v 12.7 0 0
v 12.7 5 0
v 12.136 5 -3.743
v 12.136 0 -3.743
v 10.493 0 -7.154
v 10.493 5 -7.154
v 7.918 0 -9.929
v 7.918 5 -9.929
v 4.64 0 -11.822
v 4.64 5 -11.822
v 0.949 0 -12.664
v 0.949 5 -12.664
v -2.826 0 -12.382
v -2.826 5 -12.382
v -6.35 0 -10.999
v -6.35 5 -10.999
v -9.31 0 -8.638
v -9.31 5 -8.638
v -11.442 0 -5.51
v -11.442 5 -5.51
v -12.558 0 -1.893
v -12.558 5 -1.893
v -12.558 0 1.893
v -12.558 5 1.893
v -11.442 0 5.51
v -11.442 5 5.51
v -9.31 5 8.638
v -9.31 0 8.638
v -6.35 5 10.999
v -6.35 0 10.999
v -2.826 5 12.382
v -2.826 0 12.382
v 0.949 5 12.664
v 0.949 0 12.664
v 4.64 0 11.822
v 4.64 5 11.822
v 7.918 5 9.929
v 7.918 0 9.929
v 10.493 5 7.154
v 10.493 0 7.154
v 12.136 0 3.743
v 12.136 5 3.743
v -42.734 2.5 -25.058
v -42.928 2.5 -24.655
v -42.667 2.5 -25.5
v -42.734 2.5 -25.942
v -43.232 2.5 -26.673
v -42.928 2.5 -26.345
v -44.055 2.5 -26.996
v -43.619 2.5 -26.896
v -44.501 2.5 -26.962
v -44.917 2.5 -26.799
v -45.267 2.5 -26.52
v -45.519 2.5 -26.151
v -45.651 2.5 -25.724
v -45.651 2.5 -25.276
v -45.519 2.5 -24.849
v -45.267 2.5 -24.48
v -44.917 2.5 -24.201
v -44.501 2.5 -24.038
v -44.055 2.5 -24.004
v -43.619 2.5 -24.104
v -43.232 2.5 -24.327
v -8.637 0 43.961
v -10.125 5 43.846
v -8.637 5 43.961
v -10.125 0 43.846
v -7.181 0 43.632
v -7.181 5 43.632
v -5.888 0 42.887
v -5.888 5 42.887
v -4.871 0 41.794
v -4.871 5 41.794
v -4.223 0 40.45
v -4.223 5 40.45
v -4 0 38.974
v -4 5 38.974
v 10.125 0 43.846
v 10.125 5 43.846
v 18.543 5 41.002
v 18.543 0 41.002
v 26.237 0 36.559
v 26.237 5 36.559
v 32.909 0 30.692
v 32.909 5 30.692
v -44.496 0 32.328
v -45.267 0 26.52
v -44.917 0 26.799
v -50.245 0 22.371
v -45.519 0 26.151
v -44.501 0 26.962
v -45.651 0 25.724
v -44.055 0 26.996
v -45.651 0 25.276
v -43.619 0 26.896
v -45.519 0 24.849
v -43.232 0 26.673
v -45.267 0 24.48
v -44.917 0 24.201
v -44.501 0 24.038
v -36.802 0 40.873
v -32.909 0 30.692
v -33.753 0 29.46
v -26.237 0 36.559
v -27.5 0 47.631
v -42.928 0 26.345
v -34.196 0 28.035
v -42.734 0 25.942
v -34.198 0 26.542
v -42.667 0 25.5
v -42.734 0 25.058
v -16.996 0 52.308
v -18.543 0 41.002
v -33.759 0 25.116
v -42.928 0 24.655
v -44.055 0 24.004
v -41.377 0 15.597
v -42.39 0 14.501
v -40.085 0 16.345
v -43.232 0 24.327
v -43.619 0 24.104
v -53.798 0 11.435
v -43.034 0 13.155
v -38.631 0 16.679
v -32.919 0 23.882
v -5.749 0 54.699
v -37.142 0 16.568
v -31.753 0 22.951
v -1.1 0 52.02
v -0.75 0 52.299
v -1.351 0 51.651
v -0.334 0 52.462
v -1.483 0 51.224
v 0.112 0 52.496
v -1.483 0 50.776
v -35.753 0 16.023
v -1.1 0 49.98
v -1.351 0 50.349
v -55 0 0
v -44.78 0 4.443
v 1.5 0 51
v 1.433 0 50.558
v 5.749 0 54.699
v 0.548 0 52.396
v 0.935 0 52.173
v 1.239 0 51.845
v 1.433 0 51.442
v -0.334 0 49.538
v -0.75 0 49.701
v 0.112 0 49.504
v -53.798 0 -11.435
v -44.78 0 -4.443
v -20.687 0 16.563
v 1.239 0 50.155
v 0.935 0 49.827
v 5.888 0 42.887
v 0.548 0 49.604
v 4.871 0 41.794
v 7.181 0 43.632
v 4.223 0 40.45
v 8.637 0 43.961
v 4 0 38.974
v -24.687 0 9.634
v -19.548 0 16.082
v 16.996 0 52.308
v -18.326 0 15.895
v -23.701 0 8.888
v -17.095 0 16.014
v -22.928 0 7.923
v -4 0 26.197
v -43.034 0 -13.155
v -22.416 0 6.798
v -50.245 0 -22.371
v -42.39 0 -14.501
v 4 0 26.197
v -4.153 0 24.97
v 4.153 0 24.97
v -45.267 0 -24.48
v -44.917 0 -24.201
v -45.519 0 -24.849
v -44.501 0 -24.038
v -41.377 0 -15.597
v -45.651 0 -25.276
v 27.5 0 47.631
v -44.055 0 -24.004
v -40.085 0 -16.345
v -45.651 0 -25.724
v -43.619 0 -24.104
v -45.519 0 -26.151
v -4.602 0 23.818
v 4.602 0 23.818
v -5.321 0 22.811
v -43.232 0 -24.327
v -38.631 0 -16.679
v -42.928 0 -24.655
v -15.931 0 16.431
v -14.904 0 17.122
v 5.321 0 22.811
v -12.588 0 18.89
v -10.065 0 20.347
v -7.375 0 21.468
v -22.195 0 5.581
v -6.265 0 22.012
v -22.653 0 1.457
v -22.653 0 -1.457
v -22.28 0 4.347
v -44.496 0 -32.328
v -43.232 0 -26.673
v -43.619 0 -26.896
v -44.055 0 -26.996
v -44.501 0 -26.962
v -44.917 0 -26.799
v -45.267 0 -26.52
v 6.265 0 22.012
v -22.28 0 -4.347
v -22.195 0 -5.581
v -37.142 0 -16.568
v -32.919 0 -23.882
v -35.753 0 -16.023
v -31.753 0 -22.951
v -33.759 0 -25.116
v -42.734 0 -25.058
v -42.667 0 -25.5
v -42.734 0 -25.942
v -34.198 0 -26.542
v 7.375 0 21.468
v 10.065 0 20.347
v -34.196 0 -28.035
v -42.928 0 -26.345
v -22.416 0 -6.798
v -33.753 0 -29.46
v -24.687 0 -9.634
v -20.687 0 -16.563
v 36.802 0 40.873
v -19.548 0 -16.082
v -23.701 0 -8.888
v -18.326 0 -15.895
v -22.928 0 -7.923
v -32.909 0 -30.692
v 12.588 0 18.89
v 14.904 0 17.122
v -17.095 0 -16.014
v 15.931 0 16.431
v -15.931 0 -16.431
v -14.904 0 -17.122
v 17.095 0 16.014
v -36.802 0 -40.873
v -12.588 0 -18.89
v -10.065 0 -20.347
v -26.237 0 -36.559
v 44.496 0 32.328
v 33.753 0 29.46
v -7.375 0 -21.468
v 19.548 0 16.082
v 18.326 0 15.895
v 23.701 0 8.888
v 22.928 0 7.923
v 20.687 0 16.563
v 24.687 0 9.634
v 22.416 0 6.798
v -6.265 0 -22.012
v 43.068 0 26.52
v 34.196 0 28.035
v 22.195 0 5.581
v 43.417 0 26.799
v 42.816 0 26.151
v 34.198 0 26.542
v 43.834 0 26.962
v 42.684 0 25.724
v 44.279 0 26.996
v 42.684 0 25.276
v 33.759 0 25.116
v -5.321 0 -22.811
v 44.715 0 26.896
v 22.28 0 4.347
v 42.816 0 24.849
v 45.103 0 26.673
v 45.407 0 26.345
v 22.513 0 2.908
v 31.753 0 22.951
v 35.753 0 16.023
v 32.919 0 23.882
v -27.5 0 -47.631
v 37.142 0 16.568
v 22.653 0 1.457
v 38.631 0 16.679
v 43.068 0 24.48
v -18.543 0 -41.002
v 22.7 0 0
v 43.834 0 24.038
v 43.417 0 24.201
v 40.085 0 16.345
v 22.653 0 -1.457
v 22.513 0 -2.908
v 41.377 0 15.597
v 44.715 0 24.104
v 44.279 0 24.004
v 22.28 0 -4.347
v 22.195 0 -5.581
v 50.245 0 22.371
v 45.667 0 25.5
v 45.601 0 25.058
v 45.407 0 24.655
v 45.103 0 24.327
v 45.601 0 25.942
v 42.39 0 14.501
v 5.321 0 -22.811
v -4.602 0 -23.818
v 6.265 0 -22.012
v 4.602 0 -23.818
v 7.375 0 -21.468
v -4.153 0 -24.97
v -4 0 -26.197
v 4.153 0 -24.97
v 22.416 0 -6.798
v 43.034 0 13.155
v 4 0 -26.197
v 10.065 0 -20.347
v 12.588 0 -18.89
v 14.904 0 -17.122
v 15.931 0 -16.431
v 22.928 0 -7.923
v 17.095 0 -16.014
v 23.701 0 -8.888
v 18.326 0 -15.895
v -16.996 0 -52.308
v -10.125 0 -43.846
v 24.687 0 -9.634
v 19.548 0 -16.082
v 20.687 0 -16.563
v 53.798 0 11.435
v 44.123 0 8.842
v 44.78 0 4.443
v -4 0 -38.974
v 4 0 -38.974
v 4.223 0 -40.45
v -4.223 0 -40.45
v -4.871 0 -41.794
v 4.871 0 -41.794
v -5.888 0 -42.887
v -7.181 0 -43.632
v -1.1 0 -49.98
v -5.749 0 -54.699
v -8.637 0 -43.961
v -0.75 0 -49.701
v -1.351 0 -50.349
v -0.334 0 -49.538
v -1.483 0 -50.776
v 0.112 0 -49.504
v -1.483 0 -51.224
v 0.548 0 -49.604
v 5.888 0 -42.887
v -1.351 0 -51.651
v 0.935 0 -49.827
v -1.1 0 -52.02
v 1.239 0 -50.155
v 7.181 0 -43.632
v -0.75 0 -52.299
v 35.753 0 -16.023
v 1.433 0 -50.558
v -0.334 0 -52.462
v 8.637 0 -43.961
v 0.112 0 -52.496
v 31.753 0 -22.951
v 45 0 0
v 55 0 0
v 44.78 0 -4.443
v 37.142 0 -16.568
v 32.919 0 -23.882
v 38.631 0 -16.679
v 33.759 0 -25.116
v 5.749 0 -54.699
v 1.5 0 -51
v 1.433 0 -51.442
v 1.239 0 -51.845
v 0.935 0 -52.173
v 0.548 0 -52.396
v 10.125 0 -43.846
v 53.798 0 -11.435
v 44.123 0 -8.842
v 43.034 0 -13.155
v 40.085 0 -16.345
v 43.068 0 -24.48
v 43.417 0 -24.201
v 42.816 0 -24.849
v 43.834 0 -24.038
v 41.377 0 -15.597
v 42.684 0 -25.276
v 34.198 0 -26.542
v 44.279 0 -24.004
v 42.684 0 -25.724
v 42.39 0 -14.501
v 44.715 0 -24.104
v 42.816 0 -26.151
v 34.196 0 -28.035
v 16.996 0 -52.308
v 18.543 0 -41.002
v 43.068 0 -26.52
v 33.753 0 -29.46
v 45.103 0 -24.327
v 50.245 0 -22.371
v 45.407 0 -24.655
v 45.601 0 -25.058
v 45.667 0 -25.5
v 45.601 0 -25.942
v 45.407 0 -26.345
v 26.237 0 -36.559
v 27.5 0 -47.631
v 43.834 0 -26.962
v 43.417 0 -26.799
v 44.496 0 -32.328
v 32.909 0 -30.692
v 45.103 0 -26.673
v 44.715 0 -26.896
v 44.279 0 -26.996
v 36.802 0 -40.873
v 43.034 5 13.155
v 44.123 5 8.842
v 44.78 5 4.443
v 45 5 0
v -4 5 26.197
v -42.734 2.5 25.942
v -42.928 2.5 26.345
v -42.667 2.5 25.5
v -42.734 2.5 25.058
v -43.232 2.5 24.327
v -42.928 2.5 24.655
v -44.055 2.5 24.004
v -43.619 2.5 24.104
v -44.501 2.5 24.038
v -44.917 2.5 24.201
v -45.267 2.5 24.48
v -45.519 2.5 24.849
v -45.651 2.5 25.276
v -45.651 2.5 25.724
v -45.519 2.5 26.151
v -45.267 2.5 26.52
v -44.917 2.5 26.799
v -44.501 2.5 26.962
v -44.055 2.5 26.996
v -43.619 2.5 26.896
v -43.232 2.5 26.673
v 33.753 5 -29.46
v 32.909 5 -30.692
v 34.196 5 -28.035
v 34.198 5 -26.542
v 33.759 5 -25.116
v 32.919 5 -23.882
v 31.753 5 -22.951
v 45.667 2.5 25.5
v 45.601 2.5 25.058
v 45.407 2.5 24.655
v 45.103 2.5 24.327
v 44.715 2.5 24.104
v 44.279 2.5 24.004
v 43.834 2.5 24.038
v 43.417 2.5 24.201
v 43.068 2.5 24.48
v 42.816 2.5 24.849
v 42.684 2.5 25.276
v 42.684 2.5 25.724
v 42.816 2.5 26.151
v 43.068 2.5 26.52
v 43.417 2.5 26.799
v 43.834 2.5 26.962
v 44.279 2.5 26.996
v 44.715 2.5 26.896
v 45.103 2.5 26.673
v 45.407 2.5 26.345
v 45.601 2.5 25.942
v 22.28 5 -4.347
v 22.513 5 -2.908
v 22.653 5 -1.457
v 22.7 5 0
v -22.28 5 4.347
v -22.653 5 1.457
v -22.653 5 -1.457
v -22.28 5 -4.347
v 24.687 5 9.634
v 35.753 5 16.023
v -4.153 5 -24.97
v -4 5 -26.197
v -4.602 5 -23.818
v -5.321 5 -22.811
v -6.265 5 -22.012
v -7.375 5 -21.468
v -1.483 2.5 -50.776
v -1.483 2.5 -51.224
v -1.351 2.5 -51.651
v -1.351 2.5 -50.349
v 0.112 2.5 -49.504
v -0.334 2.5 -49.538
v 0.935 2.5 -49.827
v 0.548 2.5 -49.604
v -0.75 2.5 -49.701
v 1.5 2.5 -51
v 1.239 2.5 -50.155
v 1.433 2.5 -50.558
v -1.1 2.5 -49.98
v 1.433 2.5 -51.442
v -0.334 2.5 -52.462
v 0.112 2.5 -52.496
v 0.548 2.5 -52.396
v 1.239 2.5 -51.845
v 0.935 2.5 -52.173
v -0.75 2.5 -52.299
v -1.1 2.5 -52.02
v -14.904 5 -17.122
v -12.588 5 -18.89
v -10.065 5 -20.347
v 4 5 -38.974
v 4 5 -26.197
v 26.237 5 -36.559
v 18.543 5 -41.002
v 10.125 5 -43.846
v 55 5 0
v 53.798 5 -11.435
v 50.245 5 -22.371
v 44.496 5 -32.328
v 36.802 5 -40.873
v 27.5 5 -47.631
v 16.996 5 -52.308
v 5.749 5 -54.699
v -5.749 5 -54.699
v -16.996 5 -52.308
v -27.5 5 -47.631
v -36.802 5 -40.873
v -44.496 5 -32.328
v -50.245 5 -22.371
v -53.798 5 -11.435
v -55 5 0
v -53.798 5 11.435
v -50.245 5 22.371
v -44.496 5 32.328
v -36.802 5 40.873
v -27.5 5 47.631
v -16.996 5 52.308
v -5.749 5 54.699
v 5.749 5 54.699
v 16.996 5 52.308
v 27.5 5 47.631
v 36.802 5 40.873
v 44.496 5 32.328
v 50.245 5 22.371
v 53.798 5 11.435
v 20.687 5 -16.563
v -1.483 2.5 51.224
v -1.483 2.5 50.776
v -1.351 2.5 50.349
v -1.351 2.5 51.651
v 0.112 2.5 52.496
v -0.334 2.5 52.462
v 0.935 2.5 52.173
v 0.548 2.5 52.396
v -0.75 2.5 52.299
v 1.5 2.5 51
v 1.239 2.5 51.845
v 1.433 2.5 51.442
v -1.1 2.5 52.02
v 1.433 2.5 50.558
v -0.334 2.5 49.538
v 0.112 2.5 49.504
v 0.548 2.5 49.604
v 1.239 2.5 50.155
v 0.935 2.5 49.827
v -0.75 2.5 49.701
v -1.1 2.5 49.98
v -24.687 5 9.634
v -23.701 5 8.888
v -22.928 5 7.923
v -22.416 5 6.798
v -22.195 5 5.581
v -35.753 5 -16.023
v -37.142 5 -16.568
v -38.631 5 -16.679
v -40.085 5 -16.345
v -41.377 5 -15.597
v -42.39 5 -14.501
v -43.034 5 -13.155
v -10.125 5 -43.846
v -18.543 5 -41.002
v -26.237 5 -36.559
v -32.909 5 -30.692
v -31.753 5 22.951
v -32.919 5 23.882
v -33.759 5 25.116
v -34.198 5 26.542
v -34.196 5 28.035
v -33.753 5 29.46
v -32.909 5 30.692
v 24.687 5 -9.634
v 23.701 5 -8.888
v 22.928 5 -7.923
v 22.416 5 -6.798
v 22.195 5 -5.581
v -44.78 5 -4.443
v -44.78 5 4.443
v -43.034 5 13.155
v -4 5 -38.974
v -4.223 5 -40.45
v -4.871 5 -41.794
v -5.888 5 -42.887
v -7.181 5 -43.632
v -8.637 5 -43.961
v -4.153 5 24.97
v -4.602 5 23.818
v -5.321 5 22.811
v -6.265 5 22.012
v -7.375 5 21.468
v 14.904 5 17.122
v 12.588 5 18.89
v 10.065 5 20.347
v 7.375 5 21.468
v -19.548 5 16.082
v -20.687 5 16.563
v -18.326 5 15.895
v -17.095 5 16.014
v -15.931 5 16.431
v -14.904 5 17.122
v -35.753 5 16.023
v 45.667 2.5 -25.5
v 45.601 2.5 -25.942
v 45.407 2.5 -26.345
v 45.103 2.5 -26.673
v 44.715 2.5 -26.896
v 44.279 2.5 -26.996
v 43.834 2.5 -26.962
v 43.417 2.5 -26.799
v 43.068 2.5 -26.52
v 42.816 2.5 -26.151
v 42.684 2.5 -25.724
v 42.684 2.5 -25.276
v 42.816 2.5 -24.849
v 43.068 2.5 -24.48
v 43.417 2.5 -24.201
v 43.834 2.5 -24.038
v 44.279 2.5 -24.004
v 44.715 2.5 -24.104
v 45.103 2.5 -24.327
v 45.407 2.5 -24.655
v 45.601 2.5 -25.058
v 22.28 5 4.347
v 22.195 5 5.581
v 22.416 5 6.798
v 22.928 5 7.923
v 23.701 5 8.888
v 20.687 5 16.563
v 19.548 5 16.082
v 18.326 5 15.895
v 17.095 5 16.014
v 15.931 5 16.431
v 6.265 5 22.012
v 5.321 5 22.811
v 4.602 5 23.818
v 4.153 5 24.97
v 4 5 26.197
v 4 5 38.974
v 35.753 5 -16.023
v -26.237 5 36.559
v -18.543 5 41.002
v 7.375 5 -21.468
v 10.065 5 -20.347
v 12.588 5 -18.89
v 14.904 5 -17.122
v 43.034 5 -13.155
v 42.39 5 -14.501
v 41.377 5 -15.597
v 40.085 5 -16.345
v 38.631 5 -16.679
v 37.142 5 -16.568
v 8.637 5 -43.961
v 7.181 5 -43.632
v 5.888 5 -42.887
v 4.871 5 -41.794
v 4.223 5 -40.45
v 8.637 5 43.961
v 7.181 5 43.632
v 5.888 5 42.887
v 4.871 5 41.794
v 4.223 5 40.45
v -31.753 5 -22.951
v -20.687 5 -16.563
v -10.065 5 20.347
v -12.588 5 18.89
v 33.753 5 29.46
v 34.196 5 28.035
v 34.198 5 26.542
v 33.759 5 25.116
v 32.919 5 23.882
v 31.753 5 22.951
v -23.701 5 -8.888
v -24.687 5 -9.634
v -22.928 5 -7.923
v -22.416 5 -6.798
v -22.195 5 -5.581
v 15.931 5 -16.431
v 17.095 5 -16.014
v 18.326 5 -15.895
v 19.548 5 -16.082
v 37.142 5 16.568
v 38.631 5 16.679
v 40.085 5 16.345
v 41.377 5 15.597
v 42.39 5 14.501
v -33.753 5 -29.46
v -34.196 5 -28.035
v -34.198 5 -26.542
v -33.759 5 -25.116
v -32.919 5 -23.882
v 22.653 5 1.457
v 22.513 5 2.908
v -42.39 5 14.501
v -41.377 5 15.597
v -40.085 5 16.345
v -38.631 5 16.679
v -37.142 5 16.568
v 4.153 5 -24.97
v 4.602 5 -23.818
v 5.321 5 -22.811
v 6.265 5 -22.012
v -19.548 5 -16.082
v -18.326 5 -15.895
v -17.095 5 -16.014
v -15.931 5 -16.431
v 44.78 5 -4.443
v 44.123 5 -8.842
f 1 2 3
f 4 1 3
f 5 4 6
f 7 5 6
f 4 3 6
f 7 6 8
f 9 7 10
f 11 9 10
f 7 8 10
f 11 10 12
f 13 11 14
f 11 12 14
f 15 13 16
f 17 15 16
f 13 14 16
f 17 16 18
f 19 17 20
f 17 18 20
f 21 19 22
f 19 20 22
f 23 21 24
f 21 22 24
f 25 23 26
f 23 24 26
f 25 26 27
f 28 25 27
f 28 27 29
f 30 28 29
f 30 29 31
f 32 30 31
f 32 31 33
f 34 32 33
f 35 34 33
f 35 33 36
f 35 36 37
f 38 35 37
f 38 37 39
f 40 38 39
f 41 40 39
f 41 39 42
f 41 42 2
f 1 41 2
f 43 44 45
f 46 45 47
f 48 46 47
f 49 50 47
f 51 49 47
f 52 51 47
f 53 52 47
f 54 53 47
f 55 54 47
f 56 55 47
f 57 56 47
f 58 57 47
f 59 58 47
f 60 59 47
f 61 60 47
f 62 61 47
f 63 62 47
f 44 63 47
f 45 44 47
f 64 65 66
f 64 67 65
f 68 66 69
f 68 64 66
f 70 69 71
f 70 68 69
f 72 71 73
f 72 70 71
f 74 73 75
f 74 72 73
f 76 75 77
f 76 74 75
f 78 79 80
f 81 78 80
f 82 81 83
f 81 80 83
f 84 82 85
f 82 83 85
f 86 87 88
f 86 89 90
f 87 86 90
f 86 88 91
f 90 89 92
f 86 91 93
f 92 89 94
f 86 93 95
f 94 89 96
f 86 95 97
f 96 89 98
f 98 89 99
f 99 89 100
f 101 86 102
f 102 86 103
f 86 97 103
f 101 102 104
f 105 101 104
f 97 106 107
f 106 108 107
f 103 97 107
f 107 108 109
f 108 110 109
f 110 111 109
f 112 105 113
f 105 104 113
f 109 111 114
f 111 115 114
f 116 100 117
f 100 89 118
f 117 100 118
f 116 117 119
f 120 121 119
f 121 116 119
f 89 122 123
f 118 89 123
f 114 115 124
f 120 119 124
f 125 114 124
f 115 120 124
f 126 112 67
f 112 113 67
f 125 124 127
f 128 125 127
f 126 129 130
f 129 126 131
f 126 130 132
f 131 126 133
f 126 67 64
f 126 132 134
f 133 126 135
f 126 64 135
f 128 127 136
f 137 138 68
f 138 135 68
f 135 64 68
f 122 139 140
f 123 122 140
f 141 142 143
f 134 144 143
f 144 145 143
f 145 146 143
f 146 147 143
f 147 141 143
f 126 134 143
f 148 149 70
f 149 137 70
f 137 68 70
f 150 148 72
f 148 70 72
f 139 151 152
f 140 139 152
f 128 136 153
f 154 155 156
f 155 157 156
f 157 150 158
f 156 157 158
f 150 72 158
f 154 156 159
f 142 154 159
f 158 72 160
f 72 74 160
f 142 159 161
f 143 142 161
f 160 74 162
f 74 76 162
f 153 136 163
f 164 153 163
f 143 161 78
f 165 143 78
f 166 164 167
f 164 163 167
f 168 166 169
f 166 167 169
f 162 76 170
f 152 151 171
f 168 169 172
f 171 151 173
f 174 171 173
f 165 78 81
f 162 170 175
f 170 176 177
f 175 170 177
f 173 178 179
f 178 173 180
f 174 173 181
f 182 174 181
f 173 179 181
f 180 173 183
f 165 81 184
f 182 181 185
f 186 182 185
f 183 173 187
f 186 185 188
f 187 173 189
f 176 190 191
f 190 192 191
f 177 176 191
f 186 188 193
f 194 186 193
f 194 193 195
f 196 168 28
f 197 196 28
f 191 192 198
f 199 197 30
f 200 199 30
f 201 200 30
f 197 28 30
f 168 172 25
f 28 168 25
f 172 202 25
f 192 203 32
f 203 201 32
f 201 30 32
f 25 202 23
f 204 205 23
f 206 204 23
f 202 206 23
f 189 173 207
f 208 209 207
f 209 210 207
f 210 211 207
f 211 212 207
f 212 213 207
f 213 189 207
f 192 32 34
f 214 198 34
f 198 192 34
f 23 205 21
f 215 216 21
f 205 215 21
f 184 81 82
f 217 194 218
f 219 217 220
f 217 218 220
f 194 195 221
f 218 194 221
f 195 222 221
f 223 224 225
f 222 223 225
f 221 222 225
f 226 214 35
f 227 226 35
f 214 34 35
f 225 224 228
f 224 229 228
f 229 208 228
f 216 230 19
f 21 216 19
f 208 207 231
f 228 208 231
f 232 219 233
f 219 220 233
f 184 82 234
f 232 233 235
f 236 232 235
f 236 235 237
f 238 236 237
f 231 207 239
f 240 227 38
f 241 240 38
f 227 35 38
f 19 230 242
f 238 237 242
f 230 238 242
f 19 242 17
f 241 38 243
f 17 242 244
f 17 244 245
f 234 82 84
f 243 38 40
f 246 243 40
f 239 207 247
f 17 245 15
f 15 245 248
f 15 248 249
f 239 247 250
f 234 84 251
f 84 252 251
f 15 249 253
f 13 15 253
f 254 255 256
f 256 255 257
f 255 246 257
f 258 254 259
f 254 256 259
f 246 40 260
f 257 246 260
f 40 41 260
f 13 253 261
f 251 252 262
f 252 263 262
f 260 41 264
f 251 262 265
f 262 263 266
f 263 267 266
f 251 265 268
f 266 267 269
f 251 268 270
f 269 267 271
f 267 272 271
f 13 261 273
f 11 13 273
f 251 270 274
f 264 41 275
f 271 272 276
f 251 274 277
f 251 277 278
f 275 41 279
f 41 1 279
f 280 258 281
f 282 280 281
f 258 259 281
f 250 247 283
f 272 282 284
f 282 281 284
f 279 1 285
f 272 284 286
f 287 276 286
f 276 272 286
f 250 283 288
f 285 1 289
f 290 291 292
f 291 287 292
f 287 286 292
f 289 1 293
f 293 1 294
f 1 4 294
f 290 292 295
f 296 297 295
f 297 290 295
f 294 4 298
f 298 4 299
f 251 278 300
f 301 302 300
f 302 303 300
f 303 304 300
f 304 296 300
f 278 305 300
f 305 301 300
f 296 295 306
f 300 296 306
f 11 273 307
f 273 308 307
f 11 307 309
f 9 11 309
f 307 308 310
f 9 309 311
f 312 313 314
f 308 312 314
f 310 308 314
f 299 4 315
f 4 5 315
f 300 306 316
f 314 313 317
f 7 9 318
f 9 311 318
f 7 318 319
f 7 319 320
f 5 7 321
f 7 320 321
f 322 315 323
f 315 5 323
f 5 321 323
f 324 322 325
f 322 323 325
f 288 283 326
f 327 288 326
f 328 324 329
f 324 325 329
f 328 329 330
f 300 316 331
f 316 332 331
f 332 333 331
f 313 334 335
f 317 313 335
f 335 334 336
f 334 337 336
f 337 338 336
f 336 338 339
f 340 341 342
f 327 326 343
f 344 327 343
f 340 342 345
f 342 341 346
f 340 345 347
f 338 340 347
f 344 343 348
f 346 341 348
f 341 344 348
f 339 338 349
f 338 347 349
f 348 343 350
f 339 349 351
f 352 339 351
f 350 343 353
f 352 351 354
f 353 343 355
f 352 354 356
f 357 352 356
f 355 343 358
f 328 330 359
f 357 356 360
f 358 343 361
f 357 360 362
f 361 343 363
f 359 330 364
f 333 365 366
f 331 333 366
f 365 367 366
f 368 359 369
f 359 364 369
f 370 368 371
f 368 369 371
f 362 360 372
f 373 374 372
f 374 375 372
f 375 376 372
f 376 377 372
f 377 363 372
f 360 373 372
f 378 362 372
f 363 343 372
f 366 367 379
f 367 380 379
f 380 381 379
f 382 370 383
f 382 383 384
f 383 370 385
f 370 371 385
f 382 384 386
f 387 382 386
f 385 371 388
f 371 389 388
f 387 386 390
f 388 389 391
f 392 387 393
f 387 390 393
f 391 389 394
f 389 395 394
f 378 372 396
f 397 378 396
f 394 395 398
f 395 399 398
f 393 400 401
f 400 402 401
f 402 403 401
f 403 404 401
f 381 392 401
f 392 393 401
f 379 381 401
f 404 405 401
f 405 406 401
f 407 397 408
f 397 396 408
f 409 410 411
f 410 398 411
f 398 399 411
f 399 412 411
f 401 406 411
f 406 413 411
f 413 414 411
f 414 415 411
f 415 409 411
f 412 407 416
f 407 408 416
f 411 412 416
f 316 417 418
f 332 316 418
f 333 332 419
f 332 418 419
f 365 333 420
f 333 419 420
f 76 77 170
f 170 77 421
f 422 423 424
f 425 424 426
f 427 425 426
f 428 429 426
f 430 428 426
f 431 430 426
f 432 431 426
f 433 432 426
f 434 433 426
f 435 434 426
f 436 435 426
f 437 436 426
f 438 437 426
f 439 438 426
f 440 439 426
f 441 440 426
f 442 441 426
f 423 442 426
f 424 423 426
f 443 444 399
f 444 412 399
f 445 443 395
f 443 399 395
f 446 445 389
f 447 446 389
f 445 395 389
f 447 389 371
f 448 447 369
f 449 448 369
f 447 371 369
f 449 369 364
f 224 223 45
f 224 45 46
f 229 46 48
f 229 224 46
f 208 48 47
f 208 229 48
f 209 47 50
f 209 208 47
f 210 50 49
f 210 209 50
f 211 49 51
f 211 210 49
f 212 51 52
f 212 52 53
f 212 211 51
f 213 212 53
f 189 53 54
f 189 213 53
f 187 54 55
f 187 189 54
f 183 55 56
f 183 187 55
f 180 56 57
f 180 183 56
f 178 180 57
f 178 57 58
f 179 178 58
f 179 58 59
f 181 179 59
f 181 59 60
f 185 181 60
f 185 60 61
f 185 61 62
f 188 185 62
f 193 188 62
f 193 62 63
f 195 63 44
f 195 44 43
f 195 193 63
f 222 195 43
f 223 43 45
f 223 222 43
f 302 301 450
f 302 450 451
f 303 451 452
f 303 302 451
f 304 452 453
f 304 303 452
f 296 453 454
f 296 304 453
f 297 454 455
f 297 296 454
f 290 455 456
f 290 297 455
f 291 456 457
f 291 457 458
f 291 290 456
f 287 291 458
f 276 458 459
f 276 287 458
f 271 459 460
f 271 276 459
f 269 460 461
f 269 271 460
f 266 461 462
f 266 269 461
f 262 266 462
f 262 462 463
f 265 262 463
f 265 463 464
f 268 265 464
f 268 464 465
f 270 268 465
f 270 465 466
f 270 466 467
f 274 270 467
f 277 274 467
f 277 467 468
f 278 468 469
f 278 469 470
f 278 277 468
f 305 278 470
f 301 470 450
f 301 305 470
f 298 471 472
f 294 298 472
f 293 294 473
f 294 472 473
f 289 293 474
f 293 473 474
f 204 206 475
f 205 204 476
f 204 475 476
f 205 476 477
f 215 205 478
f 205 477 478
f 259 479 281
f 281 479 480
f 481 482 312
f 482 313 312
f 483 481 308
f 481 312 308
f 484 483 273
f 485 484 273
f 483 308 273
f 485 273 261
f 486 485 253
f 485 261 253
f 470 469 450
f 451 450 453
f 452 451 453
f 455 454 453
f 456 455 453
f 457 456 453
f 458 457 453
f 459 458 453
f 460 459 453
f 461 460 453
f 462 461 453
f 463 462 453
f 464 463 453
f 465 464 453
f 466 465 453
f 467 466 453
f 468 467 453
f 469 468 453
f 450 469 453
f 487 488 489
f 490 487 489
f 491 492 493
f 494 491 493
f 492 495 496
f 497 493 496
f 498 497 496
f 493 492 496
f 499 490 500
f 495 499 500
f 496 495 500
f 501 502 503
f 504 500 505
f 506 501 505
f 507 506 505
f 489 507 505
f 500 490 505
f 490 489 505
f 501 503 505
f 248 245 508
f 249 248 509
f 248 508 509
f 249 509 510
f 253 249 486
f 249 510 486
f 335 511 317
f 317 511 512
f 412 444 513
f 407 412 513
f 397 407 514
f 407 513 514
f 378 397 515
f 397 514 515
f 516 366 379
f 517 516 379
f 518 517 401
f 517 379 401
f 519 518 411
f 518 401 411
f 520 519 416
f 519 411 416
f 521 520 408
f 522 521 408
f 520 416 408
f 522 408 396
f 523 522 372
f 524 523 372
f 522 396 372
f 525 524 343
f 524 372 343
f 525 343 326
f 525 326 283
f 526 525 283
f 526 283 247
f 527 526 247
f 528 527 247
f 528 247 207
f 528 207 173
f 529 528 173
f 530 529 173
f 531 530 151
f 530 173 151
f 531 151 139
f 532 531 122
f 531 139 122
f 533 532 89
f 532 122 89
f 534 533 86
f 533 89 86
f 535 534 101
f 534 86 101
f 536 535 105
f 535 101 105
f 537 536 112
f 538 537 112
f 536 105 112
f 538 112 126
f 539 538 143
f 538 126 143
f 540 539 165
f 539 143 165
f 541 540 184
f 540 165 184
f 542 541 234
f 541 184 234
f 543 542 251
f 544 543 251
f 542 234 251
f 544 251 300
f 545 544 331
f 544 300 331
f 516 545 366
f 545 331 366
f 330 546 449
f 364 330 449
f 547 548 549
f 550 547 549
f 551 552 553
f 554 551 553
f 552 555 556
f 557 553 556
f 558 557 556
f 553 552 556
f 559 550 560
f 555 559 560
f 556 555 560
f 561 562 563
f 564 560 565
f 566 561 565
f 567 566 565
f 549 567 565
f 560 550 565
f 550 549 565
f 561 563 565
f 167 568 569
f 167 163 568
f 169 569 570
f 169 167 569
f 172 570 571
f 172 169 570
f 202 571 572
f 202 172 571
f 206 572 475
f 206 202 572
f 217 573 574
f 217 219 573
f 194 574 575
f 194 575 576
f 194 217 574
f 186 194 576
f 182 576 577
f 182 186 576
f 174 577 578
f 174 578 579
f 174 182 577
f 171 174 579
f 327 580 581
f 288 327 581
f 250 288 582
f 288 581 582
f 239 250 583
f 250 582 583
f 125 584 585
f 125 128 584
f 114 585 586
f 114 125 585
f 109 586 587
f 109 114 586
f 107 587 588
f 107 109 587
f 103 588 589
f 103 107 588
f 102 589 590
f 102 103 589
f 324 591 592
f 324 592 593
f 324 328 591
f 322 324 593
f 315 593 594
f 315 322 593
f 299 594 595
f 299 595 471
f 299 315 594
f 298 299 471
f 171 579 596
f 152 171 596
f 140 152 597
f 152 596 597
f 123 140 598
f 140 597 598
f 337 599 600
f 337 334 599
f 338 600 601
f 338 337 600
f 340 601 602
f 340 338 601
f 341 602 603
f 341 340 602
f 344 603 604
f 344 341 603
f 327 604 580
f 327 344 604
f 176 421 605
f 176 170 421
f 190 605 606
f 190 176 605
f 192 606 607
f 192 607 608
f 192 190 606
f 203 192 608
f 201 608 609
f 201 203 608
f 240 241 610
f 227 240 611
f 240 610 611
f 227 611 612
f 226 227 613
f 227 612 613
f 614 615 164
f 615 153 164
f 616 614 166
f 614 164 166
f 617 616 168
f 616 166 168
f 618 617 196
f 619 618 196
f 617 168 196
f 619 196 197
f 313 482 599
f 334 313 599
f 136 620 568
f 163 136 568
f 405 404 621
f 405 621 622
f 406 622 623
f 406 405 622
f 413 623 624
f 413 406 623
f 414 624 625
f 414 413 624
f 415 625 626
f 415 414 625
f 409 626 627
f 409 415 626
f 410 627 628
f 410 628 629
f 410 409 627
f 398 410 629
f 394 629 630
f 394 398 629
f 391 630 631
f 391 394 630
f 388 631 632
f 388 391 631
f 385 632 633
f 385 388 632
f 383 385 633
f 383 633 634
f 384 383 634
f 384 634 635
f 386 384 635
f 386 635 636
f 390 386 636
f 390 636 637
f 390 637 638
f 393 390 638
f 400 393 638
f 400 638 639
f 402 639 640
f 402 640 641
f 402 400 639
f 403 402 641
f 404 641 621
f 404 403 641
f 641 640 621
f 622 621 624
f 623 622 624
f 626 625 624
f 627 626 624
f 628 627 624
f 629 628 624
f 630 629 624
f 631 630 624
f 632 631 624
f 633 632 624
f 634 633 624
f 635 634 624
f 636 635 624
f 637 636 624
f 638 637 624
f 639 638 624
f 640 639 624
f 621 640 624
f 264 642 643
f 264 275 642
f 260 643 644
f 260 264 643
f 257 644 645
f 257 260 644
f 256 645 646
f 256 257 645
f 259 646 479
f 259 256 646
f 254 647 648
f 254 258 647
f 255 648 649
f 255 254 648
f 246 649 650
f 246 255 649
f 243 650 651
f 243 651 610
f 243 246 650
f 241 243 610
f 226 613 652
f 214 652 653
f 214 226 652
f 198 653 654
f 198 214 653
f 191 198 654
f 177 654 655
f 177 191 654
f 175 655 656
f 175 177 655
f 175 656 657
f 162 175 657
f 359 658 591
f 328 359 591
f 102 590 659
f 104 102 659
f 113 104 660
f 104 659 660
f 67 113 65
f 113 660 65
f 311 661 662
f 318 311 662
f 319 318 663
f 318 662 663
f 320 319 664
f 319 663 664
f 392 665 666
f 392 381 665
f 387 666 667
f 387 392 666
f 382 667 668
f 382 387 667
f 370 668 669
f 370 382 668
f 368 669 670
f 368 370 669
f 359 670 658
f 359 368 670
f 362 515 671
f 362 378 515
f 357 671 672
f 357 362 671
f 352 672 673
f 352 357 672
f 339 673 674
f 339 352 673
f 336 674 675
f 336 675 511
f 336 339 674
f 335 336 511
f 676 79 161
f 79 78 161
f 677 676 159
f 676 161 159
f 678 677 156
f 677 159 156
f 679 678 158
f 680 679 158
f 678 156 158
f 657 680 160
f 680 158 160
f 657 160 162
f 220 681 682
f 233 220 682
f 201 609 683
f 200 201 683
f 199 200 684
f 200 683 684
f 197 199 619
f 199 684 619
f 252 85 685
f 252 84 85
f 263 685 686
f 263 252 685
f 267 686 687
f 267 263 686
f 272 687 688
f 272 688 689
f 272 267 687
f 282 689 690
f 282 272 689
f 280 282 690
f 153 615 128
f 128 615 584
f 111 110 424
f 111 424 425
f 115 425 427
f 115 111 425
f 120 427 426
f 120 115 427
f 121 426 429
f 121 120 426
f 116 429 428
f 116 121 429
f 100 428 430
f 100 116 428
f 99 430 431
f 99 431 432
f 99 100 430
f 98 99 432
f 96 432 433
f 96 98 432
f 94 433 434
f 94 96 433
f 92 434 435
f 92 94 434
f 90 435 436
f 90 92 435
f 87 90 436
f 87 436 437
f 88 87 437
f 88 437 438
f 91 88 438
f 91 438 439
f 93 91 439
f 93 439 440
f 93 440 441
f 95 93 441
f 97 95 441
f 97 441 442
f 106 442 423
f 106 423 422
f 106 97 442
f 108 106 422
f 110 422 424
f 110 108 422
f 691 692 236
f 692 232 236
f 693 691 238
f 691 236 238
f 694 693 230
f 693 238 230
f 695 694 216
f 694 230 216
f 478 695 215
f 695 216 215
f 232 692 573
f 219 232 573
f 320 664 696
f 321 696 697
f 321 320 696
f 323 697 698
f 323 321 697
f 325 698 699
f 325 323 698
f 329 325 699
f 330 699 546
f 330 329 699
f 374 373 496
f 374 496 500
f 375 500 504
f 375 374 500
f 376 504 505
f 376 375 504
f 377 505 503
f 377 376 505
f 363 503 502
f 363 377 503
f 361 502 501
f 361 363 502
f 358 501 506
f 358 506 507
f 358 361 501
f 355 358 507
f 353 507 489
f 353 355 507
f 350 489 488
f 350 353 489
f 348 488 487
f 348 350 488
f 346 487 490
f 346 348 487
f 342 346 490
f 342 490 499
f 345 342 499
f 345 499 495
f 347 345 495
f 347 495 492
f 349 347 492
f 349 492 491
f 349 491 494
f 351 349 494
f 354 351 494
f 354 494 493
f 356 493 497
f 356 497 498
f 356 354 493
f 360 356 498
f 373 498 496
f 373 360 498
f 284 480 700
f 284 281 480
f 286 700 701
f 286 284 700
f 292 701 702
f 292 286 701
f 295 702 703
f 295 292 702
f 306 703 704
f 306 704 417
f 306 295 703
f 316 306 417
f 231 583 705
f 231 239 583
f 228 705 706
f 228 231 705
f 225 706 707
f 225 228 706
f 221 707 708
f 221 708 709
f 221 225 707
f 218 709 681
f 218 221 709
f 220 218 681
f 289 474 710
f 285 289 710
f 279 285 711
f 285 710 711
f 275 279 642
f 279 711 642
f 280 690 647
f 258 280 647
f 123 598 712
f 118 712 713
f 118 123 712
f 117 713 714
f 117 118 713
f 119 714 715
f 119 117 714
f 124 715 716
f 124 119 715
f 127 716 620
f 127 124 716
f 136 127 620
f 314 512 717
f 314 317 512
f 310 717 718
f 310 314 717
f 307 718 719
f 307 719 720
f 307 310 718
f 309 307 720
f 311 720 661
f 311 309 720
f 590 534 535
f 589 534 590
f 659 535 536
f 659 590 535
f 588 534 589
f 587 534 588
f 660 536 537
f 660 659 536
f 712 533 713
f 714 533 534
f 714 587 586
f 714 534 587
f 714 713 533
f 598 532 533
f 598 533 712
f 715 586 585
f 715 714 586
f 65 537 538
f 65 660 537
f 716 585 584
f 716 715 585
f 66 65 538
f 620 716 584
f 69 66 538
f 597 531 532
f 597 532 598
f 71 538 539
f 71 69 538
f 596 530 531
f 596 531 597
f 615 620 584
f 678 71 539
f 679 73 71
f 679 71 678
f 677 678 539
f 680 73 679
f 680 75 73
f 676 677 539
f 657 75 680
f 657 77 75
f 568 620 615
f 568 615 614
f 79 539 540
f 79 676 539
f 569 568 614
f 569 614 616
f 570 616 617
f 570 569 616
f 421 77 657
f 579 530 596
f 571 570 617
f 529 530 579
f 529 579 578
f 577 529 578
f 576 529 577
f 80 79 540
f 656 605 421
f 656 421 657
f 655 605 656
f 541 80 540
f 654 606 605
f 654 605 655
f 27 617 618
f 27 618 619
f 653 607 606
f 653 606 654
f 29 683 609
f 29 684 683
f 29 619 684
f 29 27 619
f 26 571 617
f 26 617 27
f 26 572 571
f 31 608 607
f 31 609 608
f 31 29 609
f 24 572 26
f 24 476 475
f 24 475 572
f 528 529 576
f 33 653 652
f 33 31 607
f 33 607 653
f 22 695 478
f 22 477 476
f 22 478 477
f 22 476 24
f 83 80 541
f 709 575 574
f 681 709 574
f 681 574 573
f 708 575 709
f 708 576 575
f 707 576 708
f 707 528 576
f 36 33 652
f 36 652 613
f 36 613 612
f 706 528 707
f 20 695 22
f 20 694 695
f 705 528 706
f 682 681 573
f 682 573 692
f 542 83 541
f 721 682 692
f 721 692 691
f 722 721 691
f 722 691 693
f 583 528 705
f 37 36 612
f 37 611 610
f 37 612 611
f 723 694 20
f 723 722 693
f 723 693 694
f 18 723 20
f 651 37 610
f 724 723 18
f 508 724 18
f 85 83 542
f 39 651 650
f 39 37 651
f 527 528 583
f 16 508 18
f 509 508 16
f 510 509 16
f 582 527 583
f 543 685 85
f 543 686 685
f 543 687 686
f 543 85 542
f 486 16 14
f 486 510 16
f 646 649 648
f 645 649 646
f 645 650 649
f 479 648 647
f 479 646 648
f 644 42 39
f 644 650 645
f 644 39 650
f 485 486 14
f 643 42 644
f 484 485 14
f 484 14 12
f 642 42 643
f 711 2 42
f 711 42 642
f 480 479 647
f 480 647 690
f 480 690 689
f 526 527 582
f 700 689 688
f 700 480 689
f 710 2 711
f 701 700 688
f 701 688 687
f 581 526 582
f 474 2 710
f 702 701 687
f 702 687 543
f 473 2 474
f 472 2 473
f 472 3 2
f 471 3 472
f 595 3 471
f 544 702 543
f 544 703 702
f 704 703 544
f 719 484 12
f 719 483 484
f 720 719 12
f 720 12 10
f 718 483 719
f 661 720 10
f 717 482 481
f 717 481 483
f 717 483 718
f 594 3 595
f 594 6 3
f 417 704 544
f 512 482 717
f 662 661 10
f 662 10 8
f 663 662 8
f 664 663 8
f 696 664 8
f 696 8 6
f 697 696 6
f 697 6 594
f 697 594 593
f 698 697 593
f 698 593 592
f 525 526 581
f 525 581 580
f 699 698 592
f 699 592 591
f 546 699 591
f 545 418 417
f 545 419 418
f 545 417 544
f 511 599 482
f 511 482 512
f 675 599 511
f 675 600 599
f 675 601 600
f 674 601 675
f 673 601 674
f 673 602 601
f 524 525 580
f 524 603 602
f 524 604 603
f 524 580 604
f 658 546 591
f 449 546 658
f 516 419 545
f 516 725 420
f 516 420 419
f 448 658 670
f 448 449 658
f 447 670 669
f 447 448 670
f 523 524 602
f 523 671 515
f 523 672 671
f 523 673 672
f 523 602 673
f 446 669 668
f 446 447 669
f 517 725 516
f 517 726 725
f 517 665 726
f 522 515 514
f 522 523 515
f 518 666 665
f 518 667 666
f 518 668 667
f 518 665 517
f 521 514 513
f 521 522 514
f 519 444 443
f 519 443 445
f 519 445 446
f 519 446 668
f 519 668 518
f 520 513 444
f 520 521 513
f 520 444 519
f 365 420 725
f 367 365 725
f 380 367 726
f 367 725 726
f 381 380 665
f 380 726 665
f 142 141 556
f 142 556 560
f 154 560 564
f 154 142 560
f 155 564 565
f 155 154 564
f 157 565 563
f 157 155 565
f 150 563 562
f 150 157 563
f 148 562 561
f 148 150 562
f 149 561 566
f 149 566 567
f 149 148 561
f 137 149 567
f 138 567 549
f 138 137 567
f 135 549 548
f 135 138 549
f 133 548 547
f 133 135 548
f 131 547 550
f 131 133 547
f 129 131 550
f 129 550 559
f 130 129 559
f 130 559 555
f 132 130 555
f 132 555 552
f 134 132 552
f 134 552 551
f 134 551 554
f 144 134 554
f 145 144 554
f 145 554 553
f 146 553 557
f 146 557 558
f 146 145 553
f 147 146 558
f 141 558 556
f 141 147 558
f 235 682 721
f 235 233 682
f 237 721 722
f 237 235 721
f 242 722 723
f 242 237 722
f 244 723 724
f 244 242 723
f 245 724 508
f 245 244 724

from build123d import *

# Parameters (mm, degrees)
SKETCH1_R           = 55
BOSS_EXTRUDE1_DEPTH = 5
SKETCH2_R           = 1.5
CUT_EXTRUDE1_DEPTH  = 2.5
SKETCH5_R           = 12.7
CUT_EXTRUDE4_DEPTH  = 6
CUT_EXTRUDE5_DEPTH  = 6
FILLET1_R           = 5
FILLET2_R           = 5


with BuildPart() as part:
    # Sketch1 → Boss-Extrude1 (new body)
    with BuildSketch(Plane(origin=(0, 0, 0), x_dir=(1, 0, 0), z_dir=(0, 1, 0))):
        Circle(SKETCH1_R)
    extrude(amount=BOSS_EXTRUDE1_DEPTH)

    # Sketch2 → Cut-Extrude1 (cut)
    with BuildSketch(Plane(origin=(0, 0, 0), x_dir=(1, 0, 0), z_dir=(0, 1, 0))):
        with Locations((0, 51)):
            Circle(SKETCH2_R)
        with Locations((44.167295593, 25.5)):
            Circle(SKETCH2_R)
        with Locations((44.167295593, -25.5)):
            Circle(SKETCH2_R)
        with Locations((0, -51)):
            Circle(SKETCH2_R)
        with Locations((-44.167295593, -25.5)):
            Circle(SKETCH2_R)
        with Locations((-44.167295593, 25.5)):
            Circle(SKETCH2_R)
    extrude(amount=CUT_EXTRUDE1_DEPTH, mode=Mode.SUBTRACT)

    # Sketch5 → Cut-Extrude4 (cut, through all)
    with BuildSketch(Plane(origin=(0, 5, 0), x_dir=(1, 0, 0), z_dir=(0, 1, 0))):
        Circle(SKETCH5_R)
    extrude(amount=-CUT_EXTRUDE4_DEPTH, mode=Mode.SUBTRACT)

    # Sketch7 → Cut-Extrude5 (cut, through all)
    with BuildSketch(Plane(origin=(0, 5, 0), x_dir=(1, 0, 0), z_dir=(0, 1, 0))):
        with BuildLine():
            Line((-21.351162756, 7.708297411), (-40.816877772, 18.946833216))
            ThreePointArc((-40.816877772, 18.946833216), (-45, 0), (-40.816877772, -18.946833216))
            Line((-40.816877772, -18.946833216), (-21.351162756, -7.708297411))
            ThreePointArc((-21.351162756, -7.708297411), (-22.7, 0), (-21.351162756, 7.708297411))
        make_face()
        with BuildLine():
            Line((-17.351162756, -14.636500641), (-36.816877772, -25.875036446))
            ThreePointArc((-36.816877772, -25.875036446), (-22.5, -38.97114317), (-4, -44.821869662))
            Line((-4, -44.821869662), (-4, -22.344798052))
            ThreePointArc((-4, -22.344798052), (-11.35, -19.658776666), (-17.351162756, -14.636500641))
        make_face()
        with BuildLine():
            ThreePointArc((4, -44.821869662), (22.5, -38.97114317), (36.816877772, -25.875036446))
            Line((36.816877772, -25.875036446), (17.351162756, -14.636500641))
            ThreePointArc((17.351162756, -14.636500641), (11.35, -19.658776666), (4, -22.344798052))
            Line((4, -22.344798052), (4, -44.821869662))
        make_face()
        with BuildLine():
            ThreePointArc((45, 0), (43.941776818, 9.701559159), (40.816877772, 18.946833216))
            Line((40.816877772, 18.946833216), (21.351162756, 7.708297411))
            ThreePointArc((21.351162756, 7.708297411), (22.360248149, 3.912710406), (22.7, 0))
            ThreePointArc((22.7, 0), (22.360248149, -3.912710406), (21.351162756, -7.708297411))
            Line((21.351162756, -7.708297411), (40.816877772, -18.946833216))
            ThreePointArc((40.816877772, -18.946833216), (43.941776818, -9.701559159), (45, 0))
        make_face()
        with BuildLine():
            ThreePointArc((36.816877772, 25.875036446), (22.5, 38.97114317), (4, 44.821869662))
            Line((4, 44.821869662), (4, 22.344798052))
            ThreePointArc((4, 22.344798052), (11.35, 19.658776666), (17.351162756, 14.636500641))
            Line((17.351162756, 14.636500641), (36.816877772, 25.875036446))
        make_face()
        with BuildLine():
            Line((-4, 22.344798052), (-4, 44.821869662))
            ThreePointArc((-4, 44.821869662), (-22.5, 38.97114317), (-36.816877772, 25.875036446))
            Line((-36.816877772, 25.875036446), (-17.351162756, 14.636500641))
            ThreePointArc((-17.351162756, 14.636500641), (-11.35, 19.658776666), (-4, 22.344798052))
        make_face()
    extrude(amount=-CUT_EXTRUDE5_DEPTH, mode=Mode.SUBTRACT)

    # Fillet1
    fillet1_edges = [part.edges().sort_by_distance(p)[0] for p in [
        (-40.816877772, 2.5, -18.946833216),
        (-21.351162756, 2.5, -7.708297411),
        (-21.351162756, 2.5, 7.708297411),
        (-40.816877772, 2.5, 18.946833216),
    ]]
    fillet(fillet1_edges, radius=FILLET1_R)

    # Fillet2
    fillet2_edges = [part.edges().sort_by_distance(p)[0] for p in [
        (40.816877772, 2.5, 18.946833216),
        (21.351162756, 2.5, 7.708297411),
        (21.351162756, 2.5, -7.708297411),
        (40.816877772, 2.5, -18.946833216),
        (36.816877772, 2.5, -25.875036446),
        (17.351162756, 2.5, -14.636500641),
        (4, 2.5, -22.344798052),
        (4, 2.5, -44.821869662),
        (4, 2.5, 44.821869662),
        (4, 2.5, 22.344798052),
        (17.351162756, 2.5, 14.636500641),
        (36.816877772, 2.5, 25.875036446),
        (-36.816877772, 2.5, 25.875036446),
        (-17.351162756, 2.5, 14.636500641),
        (-4, 2.5, 22.344798052),
        (-4, 2.5, 44.821869662),
        (-4, 2.5, -44.821869662),
        (-4, 2.5, -22.344798052),
        (-17.351162756, 2.5, -14.636500641),
        (-36.816877772, 2.5, -25.875036446),
    ]]
    fillet(fillet2_edges, radius=FILLET2_R)


solid = part.part
